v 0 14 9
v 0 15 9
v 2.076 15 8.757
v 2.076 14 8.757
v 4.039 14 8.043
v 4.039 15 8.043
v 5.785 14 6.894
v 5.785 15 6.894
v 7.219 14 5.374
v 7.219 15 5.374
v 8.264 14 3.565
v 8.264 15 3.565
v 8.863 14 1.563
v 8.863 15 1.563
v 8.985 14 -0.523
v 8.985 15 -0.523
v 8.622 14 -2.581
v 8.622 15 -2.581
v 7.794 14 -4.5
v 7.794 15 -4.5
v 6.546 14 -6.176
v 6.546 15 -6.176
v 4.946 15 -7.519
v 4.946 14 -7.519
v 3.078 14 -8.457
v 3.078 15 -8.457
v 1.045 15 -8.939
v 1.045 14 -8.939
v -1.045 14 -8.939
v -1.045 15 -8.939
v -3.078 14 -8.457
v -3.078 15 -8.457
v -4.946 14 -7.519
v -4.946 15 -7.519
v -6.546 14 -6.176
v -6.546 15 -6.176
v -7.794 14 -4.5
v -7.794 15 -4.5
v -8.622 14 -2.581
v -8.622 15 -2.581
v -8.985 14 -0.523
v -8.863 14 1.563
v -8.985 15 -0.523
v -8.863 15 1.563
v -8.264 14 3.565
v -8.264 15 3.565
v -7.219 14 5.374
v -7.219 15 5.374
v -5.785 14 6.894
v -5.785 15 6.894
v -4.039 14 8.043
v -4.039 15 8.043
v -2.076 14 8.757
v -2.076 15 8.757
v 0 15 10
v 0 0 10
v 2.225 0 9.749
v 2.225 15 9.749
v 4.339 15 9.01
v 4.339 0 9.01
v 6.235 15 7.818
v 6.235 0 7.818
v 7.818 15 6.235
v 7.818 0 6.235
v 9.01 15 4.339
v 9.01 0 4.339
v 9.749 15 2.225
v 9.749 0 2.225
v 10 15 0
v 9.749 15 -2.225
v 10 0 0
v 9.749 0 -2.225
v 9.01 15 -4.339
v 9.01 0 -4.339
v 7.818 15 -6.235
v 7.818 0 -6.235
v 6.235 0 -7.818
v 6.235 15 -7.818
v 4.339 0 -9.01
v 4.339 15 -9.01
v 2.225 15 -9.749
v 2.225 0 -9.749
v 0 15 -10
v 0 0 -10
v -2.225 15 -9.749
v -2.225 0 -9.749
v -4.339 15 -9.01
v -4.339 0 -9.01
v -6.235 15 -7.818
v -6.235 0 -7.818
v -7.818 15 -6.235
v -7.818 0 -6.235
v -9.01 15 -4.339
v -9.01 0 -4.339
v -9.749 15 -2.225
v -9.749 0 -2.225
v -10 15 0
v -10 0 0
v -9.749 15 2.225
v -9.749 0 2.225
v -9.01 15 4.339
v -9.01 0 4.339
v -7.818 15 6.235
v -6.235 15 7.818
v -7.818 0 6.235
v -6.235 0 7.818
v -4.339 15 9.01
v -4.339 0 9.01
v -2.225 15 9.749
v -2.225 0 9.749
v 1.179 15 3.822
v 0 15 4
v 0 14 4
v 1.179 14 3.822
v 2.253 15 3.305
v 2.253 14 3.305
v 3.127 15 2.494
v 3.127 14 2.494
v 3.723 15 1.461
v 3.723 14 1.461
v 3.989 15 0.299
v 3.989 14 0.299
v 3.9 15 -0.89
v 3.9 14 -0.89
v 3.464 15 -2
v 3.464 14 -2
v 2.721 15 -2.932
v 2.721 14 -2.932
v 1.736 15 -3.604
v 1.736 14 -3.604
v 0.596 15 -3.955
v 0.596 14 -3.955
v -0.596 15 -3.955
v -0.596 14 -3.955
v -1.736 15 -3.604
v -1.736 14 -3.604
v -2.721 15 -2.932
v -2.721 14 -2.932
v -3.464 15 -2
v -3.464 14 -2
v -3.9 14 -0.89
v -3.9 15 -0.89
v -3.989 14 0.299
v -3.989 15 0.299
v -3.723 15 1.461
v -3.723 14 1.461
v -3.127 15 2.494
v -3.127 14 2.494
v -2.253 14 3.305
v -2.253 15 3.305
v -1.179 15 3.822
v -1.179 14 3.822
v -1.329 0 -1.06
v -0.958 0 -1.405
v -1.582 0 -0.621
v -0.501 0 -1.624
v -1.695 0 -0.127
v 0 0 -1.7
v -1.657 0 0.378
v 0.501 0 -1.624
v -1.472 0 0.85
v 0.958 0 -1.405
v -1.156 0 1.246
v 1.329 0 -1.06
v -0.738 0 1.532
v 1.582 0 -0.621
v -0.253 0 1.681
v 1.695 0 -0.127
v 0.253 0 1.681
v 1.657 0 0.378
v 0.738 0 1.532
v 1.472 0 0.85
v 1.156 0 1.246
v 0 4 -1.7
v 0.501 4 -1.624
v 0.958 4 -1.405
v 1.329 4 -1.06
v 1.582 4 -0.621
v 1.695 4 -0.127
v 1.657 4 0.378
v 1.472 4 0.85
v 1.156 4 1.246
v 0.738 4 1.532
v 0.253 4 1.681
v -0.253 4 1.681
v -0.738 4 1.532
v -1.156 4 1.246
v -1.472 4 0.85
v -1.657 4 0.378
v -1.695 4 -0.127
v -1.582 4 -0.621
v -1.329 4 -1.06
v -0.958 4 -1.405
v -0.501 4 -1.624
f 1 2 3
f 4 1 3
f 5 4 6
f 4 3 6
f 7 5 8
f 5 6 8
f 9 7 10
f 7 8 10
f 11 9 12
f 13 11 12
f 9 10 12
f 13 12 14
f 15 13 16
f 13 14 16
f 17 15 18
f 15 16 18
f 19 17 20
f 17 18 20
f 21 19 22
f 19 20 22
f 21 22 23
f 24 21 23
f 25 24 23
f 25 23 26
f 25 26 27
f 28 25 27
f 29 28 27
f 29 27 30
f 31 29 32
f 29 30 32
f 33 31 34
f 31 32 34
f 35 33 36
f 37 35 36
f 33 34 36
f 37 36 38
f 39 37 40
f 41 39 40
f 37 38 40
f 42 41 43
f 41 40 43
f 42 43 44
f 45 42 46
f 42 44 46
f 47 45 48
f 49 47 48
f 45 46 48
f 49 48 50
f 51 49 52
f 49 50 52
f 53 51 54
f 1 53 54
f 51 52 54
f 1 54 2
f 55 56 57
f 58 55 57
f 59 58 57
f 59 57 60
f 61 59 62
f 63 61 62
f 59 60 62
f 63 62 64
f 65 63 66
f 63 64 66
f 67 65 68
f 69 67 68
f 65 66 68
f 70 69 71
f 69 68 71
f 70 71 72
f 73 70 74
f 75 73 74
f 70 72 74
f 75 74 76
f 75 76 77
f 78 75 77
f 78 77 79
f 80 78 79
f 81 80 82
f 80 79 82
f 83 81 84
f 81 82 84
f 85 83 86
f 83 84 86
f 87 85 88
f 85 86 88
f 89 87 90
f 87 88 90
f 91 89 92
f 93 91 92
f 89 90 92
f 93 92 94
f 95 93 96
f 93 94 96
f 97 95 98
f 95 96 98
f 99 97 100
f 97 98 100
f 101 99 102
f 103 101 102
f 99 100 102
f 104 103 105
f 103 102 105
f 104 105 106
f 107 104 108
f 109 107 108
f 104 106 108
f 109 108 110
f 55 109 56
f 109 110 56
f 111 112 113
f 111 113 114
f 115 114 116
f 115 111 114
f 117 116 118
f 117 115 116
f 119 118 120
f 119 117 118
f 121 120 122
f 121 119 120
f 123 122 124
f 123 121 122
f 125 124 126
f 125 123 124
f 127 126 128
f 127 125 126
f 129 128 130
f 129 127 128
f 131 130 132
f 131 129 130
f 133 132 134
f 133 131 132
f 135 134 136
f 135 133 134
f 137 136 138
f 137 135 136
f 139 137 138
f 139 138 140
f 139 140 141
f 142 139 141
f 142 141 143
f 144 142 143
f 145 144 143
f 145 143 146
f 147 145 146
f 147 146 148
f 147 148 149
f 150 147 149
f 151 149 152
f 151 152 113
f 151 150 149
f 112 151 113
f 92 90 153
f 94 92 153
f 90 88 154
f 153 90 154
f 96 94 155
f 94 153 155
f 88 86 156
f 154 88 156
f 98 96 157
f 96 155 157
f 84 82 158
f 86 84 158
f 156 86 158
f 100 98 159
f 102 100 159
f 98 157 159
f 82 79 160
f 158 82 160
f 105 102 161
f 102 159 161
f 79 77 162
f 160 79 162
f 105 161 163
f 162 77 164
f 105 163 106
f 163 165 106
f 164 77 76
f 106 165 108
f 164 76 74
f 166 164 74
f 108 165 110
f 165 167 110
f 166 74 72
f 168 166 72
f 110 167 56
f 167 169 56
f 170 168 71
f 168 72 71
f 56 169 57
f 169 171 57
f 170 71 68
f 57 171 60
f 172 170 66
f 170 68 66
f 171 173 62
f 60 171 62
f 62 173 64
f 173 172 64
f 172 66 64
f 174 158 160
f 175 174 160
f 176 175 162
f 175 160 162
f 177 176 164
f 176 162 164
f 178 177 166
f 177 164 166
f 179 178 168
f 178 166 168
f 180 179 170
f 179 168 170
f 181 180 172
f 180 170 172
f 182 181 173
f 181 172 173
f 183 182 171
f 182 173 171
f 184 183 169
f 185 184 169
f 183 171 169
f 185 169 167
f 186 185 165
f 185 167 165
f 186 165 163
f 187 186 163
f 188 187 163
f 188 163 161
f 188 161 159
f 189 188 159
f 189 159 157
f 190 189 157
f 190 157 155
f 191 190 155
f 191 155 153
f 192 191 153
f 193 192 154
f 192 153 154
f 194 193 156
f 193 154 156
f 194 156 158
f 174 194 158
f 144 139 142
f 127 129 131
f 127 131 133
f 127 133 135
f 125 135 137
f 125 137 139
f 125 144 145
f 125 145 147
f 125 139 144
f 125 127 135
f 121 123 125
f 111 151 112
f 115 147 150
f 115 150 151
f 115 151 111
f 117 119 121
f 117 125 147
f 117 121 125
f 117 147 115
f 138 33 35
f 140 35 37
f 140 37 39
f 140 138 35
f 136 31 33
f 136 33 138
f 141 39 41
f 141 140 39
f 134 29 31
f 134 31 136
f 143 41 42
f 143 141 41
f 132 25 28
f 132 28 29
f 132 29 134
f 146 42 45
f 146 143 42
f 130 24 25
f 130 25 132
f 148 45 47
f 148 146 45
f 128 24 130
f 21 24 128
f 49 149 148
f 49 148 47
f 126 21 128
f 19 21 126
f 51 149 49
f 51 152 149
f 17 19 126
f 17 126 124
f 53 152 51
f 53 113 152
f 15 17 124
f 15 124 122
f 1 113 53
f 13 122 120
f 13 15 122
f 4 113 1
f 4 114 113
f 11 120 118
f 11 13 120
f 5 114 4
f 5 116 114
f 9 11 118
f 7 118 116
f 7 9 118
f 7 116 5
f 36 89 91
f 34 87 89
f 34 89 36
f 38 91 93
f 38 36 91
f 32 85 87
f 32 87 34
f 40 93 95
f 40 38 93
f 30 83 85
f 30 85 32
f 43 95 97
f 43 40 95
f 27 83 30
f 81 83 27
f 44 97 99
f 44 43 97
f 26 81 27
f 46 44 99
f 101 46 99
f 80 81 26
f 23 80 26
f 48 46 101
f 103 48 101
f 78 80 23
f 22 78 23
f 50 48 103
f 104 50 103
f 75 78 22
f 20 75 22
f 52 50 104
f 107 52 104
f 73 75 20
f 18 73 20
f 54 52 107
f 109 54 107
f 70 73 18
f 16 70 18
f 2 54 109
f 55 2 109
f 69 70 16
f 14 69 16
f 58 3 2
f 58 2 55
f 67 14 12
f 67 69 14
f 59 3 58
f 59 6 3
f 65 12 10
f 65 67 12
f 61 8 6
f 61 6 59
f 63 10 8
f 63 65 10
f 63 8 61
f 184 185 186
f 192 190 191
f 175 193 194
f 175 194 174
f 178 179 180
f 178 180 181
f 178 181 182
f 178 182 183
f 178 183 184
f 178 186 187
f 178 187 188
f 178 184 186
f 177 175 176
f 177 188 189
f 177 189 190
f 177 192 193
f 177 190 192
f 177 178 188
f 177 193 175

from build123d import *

# Parameters (mm, degrees)
SKETCH1_R           = 10
BOSS_EXTRUDE1_DEPTH = 15
SKETCH2_R           = 9
SKETCH2_R_2         = 4
CUT_EXTRUDE1_DEPTH  = 1
SKETCH3_R           = 1.7
CUT_EXTRUDE2_DEPTH  = 4


with BuildPart() as part:
    # Sketch1 → Boss-Extrude1 (new body)
    with BuildSketch(Plane(origin=(0, 0, 0), x_dir=(1, 0, 0), z_dir=(0, 1, 0))):
        with Locations(Location((0, 0, 0), (0, 0, 270))):
            Circle(SKETCH1_R)
    extrude(amount=BOSS_EXTRUDE1_DEPTH)

    # Sketch2 → Cut-Extrude1 (cut)
    with BuildSketch(Plane(origin=(0, 15, 0), x_dir=(1, 0, 0), z_dir=(0, 1, 0))):
        with Locations(Location((0, 0, 0), (0, 0, 270))):
            Circle(SKETCH2_R)
        with Locations(Location((0, 0, 0), (0, 0, 270))):
            Circle(SKETCH2_R_2, mode=Mode.SUBTRACT)
    extrude(amount=-CUT_EXTRUDE1_DEPTH, mode=Mode.SUBTRACT)

    # Sketch3 → Cut-Extrude2 (cut)
    with BuildSketch(Plane.XZ):
        with Locations(Location((0, 0, 0), (0, 0, 270))):
            Circle(SKETCH3_R)
    extrude(amount=-CUT_EXTRUDE2_DEPTH, mode=Mode.SUBTRACT)


solid = part.part
